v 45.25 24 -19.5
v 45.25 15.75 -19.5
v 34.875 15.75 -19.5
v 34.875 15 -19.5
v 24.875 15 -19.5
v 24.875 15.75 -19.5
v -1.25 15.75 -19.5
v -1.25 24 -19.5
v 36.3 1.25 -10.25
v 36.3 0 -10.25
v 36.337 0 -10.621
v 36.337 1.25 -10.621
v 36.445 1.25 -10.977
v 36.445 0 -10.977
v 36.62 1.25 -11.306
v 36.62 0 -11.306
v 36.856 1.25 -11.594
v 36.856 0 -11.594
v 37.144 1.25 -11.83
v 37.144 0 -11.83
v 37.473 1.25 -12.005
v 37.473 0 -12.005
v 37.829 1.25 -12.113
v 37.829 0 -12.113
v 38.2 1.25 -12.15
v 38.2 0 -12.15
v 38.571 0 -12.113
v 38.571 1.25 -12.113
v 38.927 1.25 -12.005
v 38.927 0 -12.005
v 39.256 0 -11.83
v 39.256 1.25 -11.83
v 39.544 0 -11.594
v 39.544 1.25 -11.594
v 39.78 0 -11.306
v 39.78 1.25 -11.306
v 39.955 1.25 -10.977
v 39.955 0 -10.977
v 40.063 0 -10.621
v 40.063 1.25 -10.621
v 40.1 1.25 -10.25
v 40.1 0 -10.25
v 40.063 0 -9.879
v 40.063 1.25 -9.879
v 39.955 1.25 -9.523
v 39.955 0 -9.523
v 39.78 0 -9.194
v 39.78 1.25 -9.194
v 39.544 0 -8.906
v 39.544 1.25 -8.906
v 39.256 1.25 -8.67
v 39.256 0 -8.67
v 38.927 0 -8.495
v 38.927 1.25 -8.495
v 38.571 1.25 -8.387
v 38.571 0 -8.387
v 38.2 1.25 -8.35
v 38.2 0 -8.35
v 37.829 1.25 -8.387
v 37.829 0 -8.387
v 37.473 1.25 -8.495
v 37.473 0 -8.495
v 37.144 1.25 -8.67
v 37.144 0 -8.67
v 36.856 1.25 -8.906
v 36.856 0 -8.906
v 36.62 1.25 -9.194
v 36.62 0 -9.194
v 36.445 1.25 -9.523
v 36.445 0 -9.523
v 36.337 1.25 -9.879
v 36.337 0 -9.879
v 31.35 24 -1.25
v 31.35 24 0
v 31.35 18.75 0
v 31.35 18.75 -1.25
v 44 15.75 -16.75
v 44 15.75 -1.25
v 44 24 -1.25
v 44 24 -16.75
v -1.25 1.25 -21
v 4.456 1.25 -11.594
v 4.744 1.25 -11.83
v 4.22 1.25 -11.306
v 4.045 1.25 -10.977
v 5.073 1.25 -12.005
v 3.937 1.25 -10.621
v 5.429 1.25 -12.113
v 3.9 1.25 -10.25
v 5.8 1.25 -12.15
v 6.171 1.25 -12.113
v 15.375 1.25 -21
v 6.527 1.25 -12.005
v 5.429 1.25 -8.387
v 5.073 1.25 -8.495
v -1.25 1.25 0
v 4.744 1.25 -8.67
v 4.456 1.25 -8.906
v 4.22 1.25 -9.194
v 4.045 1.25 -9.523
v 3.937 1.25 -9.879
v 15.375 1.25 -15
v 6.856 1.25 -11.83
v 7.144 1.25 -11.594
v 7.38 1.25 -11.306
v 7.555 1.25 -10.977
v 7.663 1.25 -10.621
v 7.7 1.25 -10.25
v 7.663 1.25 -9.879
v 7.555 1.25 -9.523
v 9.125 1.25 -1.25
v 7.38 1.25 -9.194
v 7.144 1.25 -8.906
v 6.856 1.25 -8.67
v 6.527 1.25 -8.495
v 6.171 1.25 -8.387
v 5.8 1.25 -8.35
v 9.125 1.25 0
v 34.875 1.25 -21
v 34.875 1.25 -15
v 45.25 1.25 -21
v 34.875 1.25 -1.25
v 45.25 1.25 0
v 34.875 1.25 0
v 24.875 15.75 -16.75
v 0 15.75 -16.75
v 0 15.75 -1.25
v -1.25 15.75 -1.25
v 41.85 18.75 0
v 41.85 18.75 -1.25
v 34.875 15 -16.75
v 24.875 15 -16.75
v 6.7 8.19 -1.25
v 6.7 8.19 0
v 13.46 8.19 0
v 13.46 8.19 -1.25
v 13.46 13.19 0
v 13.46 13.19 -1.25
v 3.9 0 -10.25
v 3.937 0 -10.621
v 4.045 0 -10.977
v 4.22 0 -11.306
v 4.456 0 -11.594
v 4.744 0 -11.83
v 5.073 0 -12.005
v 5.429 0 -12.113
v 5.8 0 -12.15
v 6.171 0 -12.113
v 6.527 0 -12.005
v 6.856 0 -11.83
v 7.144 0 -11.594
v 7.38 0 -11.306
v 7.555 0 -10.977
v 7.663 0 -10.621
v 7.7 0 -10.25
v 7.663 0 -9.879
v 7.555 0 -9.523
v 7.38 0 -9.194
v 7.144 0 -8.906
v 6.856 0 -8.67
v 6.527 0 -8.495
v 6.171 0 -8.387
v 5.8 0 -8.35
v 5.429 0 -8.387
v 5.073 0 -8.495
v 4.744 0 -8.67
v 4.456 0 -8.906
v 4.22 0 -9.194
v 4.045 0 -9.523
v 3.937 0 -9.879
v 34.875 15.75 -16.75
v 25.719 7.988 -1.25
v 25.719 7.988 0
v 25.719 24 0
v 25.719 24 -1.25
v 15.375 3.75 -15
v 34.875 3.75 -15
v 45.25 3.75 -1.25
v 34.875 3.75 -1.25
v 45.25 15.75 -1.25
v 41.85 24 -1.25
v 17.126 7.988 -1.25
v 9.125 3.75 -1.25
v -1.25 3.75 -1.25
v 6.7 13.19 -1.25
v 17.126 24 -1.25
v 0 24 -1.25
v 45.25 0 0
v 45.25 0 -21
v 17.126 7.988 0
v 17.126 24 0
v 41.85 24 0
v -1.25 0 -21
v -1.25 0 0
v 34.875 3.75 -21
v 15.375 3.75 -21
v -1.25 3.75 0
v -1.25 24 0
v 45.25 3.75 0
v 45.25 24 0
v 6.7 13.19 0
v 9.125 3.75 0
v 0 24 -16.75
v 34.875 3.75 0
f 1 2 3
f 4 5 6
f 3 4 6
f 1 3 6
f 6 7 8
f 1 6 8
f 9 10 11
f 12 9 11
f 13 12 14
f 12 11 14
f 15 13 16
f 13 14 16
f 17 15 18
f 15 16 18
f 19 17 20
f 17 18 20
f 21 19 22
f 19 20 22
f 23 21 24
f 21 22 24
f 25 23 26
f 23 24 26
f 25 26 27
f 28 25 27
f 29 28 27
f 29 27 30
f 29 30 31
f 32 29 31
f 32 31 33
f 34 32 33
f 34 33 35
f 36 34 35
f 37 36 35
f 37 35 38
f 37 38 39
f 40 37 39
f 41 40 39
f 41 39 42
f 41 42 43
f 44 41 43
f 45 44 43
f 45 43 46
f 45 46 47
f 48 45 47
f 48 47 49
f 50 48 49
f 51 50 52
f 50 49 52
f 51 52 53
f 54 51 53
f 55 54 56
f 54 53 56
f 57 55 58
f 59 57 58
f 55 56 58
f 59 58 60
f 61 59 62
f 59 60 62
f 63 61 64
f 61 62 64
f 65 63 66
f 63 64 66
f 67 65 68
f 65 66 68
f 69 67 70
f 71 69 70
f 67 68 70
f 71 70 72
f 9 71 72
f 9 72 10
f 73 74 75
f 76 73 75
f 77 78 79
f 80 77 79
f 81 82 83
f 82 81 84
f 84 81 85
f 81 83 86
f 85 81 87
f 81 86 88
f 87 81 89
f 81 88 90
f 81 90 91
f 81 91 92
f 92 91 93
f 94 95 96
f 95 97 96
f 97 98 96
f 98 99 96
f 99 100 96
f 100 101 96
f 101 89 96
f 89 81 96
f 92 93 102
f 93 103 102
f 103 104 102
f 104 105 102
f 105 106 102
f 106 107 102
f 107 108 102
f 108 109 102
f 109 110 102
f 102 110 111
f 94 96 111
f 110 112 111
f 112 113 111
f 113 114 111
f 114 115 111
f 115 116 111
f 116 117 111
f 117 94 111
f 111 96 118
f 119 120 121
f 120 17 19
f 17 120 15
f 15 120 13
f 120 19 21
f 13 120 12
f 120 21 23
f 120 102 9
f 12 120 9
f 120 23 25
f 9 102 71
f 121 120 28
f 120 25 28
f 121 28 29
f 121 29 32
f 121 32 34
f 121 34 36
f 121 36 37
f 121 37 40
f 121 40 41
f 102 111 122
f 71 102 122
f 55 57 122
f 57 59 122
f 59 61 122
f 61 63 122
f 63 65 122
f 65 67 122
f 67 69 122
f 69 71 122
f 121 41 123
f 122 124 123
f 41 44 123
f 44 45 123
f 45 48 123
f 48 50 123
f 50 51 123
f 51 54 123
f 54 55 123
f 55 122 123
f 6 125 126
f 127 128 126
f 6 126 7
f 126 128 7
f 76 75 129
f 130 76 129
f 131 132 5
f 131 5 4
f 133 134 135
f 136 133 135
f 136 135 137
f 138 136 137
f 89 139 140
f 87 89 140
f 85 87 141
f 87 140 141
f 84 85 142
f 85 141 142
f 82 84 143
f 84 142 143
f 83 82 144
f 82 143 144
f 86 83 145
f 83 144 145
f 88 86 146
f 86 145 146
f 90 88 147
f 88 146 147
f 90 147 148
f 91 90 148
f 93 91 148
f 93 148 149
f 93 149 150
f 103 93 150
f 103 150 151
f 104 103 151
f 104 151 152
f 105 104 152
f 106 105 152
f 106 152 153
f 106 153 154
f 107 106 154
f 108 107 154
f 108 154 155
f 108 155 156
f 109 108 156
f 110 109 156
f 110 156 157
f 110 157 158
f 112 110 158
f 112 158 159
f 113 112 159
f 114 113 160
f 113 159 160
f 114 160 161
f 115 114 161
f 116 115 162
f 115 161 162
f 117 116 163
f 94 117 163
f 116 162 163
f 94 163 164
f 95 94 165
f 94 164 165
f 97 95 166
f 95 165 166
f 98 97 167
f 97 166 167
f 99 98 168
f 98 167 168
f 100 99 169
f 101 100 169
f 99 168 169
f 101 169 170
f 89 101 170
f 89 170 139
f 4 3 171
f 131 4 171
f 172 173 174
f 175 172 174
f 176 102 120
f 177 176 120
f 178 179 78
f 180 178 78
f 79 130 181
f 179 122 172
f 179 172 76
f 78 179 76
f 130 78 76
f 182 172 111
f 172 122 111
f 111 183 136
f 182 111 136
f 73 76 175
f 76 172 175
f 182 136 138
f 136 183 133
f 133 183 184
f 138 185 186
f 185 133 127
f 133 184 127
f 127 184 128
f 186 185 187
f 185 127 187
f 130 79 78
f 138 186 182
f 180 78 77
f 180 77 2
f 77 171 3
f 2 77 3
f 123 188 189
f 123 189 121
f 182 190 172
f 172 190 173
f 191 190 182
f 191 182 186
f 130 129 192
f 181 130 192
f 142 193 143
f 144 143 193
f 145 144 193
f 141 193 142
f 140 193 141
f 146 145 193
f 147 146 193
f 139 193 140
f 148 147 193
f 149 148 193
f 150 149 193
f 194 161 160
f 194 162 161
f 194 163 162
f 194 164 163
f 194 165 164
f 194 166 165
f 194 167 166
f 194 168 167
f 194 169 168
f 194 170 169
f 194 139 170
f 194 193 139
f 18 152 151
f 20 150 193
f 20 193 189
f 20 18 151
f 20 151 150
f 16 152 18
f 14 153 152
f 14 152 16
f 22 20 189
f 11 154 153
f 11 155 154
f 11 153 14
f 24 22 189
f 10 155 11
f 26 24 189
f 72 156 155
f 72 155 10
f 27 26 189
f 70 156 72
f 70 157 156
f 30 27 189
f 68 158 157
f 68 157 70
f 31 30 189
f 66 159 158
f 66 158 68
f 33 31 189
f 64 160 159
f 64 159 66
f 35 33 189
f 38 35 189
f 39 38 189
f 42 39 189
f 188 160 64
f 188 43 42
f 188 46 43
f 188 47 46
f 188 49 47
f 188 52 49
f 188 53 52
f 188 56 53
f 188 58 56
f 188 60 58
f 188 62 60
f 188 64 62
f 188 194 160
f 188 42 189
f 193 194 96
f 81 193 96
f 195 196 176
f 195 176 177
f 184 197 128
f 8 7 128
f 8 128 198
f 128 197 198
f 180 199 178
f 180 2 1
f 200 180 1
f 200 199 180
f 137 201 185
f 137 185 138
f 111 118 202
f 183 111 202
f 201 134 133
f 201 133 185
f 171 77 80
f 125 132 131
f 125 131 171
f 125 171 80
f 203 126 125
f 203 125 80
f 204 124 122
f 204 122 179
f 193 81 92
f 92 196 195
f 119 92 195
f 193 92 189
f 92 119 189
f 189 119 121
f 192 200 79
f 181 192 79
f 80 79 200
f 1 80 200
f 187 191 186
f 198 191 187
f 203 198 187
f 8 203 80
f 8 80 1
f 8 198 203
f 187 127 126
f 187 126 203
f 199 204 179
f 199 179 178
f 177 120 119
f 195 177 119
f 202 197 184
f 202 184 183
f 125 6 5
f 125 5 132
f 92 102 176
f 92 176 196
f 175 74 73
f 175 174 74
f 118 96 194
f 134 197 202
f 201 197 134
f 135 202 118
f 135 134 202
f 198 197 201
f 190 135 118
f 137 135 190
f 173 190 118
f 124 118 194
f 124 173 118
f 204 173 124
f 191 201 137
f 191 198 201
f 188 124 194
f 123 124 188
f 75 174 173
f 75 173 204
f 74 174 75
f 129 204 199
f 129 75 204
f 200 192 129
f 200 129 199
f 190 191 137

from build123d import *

# Parameters (mm, degrees)
SKETCH1_W               = 46.5
SKETCH1_H               = 24
BOSS_EXTRUDE1_DEPTH     = 21
SHELL1_T                = -1.25
SKETCH2_W               = 19.75
SKETCH2_H               = 14.5
CUT_EXTRUDE1_DEPTH      = 47.5
SKETCH7_W               = 10.375
SKETCH7_H               = 2.5
CUT_EXTRUDE5_DEPTH      = 1.25
SKETCH9_W               = 19.5
SKETCH9_H               = 6
BOSS_EXTRUDE3_DEPTH     = 2.5
CUT_EXTRUDE7_START      = -45.25
SKETCH12_W              = 1.5
SKETCH12_H              = 8.25
CUT_EXTRUDE7_DEPTH      = 46.25
CUT_EXTRUDE7_DEPTH_BACK = 47.5
SKETCH13_W              = 2.75
SKETCH13_H              = 8.25
BOSS_EXTRUDE4_DEPTH     = 44
SKETCH15_W              = 10
SKETCH15_H              = 2.75
BOSS_EXTRUDE5_DEPTH     = 0.75
CUT_EXTRUDE8_REACH      = 23
SKETCH18_W              = 6.76
SKETCH18_H              = 5
CUT_EXTRUDE9_REACH      = 23
SKETCH22_W              = 8.593751287
SKETCH22_H              = 16.011767213
CUT_EXTRUDE15_REACH     = 23
SKETCH25_W              = 10
SKETCH25_H              = 4.5
CUT_EXTRUDE16_REACH     = 26
SKETCH6_R               = 1.9


with BuildPart() as part:
    # Sketch1 → Boss-Extrude1 (new body)
    with BuildSketch(Plane.XY):
        with Locations((22, 12)):
            Rectangle(SKETCH1_W, SKETCH1_H)
    extrude(amount=-BOSS_EXTRUDE1_DEPTH)

    # Shell1
    shell1_openings = [part.faces().sort_by_distance(p)[0] for p in [
        (22, 12, -21),
        (22, 24, -10.5),
    ]]
    offset(amount=SHELL1_T, openings=shell1_openings, kind=Kind.INTERSECTION)

    # Sketch2 → Cut-Extrude1 (cut, through all)
    with BuildSketch(Plane.ZY.offset(1.25)):
        with Locations((-11.125, 8.5)):
            Rectangle(SKETCH2_W, SKETCH2_H)
    extrude(amount=-CUT_EXTRUDE1_DEPTH, mode=Mode.SUBTRACT)

    # Sketch7 → Cut-Extrude5 (cut)
    with BuildSketch(Plane.XY):
        with Locations((40.0625, 2.5)):
            Rectangle(SKETCH7_W, SKETCH7_H)
        with Locations((3.9375, 2.5)):
            Rectangle(SKETCH7_W, SKETCH7_H)
    extrude(amount=-CUT_EXTRUDE5_DEPTH, mode=Mode.SUBTRACT)

    # Sketch9 → Boss-Extrude3 (add)
    with BuildSketch(Plane(origin=(0, 1.25, 0), x_dir=(1, 0, 0), z_dir=(0, 1, 0))):
        with Locations((25.125, 18)):
            Rectangle(SKETCH9_W, SKETCH9_H)
    extrude(amount=BOSS_EXTRUDE3_DEPTH)

    # Sketch12 → Cut-Extrude7 (cut, two sides)
    with BuildSketch(Plane(origin=(45.25, 0, 0), x_dir=(0, 0, -1), z_dir=(1, 0, 0)).offset(CUT_EXTRUDE7_START)) as cut_extrude7_sk:
        with Locations((20.25, 19.875)):
            Rectangle(SKETCH12_W, SKETCH12_H)
    extrude(amount=CUT_EXTRUDE7_DEPTH, mode=Mode.SUBTRACT)
    extrude(cut_extrude7_sk.sketch, amount=-CUT_EXTRUDE7_DEPTH_BACK, mode=Mode.SUBTRACT)

    # Sketch13 → Boss-Extrude4 (add)
    with BuildSketch(Plane(origin=(0, 0, 0), x_dir=(0, 0, -1), z_dir=(1, 0, 0))):
        with Locations((18.125, 19.875)):
            Rectangle(SKETCH13_W, SKETCH13_H)
    extrude(amount=BOSS_EXTRUDE4_DEPTH)

    # Sketch15 → Boss-Extrude5 (add)
    with BuildSketch(Plane.XZ.offset(-15.75)):
        with Locations((29.875, -18.125)):
            Rectangle(SKETCH15_W, SKETCH15_H)
    extrude(amount=BOSS_EXTRUDE5_DEPTH)

    # Sketch18 → Cut-Extrude8 (cut, up to next)
    with BuildSketch(Plane.XY, mode=Mode.PRIVATE) as cut_extrude8_sk1:
        with Locations((10.08, 10.69)):
            Rectangle(SKETCH18_W, SKETCH18_H)
    cut_extrude8_tool1 = extrude(cut_extrude8_sk1.sketch, amount=-CUT_EXTRUDE8_REACH, mode=Mode.PRIVATE) & part.part
    add(cut_extrude8_tool1.solids().sort_by_distance((10.08, 10.69, 0))[0], mode=Mode.SUBTRACT)

    # Sketch22 → Cut-Extrude9 (cut, up to next)
    with BuildSketch(Plane.XY, mode=Mode.PRIVATE) as cut_extrude9_sk1:
        with Locations((21.422492142, 15.994116394)):
            Rectangle(SKETCH22_W, SKETCH22_H)
    cut_extrude9_tool1 = extrude(cut_extrude9_sk1.sketch, amount=-CUT_EXTRUDE9_REACH, mode=Mode.PRIVATE) & part.part
    add(cut_extrude9_tool1.solids().sort_by_distance((21.422492, 15.994116, 0))[0], mode=Mode.SUBTRACT)

    # Sketch25 → Cut-Extrude15 (cut, up to next)
    with BuildSketch(Plane.XY, mode=Mode.PRIVATE) as cut_extrude15_sk1:
        Polygon((31.35, 18.75), (41.85, 18.75), (41.85, 24), (41.6, 24), (41.6, 19.5), (31.6, 19.5), (31.6, 24), (31.35, 24), align=None)
    cut_extrude15_tool1 = extrude(cut_extrude15_sk1.sketch, amount=-CUT_EXTRUDE15_REACH, mode=Mode.PRIVATE) & part.part
    add(cut_extrude15_tool1.solids().sort_by_distance((31.475, 23.882606, 0))[0], mode=Mode.SUBTRACT)
    # Sketch25 → Cut-Extrude15 (cut, up to next)
    with BuildSketch(Plane.XY, mode=Mode.PRIVATE) as cut_extrude15_sk2:
        with Locations((36.6, 21.75)):
            Rectangle(SKETCH25_W, SKETCH25_H)
    cut_extrude15_tool2 = extrude(cut_extrude15_sk2.sketch, amount=-CUT_EXTRUDE15_REACH, mode=Mode.PRIVATE) & part.part
    add(cut_extrude15_tool2.solids().sort_by_distance((36.6, 21.75, 0))[0], mode=Mode.SUBTRACT)

    # Sketch6 → Cut-Extrude16 (cut, up to next)
    with BuildSketch(Plane(origin=(0, 0, 0), x_dir=(-1, 0, 0), z_dir=(0, -1, 0)), mode=Mode.PRIVATE) as cut_extrude16_sk1:
        with Locations((-5.8, 10.25)):
            Circle(SKETCH6_R)
    cut_extrude16_tool1 = extrude(cut_extrude16_sk1.sketch, amount=-CUT_EXTRUDE16_REACH, mode=Mode.PRIVATE) & part.part
    add(cut_extrude16_tool1.solids().sort_by_distance((5.8, 0, -10.25))[0], mode=Mode.SUBTRACT)
    # Sketch6 → Cut-Extrude16 (cut, up to next)
    with BuildSketch(Plane(origin=(0, 0, 0), x_dir=(-1, 0, 0), z_dir=(0, -1, 0)), mode=Mode.PRIVATE) as cut_extrude16_sk2:
        with Locations((-38.2, 10.25)):
            Circle(SKETCH6_R)
    cut_extrude16_tool2 = extrude(cut_extrude16_sk2.sketch, amount=-CUT_EXTRUDE16_REACH, mode=Mode.PRIVATE) & part.part
    add(cut_extrude16_tool2.solids().sort_by_distance((38.2, 0, -10.25))[0], mode=Mode.SUBTRACT)


solid = part.part
